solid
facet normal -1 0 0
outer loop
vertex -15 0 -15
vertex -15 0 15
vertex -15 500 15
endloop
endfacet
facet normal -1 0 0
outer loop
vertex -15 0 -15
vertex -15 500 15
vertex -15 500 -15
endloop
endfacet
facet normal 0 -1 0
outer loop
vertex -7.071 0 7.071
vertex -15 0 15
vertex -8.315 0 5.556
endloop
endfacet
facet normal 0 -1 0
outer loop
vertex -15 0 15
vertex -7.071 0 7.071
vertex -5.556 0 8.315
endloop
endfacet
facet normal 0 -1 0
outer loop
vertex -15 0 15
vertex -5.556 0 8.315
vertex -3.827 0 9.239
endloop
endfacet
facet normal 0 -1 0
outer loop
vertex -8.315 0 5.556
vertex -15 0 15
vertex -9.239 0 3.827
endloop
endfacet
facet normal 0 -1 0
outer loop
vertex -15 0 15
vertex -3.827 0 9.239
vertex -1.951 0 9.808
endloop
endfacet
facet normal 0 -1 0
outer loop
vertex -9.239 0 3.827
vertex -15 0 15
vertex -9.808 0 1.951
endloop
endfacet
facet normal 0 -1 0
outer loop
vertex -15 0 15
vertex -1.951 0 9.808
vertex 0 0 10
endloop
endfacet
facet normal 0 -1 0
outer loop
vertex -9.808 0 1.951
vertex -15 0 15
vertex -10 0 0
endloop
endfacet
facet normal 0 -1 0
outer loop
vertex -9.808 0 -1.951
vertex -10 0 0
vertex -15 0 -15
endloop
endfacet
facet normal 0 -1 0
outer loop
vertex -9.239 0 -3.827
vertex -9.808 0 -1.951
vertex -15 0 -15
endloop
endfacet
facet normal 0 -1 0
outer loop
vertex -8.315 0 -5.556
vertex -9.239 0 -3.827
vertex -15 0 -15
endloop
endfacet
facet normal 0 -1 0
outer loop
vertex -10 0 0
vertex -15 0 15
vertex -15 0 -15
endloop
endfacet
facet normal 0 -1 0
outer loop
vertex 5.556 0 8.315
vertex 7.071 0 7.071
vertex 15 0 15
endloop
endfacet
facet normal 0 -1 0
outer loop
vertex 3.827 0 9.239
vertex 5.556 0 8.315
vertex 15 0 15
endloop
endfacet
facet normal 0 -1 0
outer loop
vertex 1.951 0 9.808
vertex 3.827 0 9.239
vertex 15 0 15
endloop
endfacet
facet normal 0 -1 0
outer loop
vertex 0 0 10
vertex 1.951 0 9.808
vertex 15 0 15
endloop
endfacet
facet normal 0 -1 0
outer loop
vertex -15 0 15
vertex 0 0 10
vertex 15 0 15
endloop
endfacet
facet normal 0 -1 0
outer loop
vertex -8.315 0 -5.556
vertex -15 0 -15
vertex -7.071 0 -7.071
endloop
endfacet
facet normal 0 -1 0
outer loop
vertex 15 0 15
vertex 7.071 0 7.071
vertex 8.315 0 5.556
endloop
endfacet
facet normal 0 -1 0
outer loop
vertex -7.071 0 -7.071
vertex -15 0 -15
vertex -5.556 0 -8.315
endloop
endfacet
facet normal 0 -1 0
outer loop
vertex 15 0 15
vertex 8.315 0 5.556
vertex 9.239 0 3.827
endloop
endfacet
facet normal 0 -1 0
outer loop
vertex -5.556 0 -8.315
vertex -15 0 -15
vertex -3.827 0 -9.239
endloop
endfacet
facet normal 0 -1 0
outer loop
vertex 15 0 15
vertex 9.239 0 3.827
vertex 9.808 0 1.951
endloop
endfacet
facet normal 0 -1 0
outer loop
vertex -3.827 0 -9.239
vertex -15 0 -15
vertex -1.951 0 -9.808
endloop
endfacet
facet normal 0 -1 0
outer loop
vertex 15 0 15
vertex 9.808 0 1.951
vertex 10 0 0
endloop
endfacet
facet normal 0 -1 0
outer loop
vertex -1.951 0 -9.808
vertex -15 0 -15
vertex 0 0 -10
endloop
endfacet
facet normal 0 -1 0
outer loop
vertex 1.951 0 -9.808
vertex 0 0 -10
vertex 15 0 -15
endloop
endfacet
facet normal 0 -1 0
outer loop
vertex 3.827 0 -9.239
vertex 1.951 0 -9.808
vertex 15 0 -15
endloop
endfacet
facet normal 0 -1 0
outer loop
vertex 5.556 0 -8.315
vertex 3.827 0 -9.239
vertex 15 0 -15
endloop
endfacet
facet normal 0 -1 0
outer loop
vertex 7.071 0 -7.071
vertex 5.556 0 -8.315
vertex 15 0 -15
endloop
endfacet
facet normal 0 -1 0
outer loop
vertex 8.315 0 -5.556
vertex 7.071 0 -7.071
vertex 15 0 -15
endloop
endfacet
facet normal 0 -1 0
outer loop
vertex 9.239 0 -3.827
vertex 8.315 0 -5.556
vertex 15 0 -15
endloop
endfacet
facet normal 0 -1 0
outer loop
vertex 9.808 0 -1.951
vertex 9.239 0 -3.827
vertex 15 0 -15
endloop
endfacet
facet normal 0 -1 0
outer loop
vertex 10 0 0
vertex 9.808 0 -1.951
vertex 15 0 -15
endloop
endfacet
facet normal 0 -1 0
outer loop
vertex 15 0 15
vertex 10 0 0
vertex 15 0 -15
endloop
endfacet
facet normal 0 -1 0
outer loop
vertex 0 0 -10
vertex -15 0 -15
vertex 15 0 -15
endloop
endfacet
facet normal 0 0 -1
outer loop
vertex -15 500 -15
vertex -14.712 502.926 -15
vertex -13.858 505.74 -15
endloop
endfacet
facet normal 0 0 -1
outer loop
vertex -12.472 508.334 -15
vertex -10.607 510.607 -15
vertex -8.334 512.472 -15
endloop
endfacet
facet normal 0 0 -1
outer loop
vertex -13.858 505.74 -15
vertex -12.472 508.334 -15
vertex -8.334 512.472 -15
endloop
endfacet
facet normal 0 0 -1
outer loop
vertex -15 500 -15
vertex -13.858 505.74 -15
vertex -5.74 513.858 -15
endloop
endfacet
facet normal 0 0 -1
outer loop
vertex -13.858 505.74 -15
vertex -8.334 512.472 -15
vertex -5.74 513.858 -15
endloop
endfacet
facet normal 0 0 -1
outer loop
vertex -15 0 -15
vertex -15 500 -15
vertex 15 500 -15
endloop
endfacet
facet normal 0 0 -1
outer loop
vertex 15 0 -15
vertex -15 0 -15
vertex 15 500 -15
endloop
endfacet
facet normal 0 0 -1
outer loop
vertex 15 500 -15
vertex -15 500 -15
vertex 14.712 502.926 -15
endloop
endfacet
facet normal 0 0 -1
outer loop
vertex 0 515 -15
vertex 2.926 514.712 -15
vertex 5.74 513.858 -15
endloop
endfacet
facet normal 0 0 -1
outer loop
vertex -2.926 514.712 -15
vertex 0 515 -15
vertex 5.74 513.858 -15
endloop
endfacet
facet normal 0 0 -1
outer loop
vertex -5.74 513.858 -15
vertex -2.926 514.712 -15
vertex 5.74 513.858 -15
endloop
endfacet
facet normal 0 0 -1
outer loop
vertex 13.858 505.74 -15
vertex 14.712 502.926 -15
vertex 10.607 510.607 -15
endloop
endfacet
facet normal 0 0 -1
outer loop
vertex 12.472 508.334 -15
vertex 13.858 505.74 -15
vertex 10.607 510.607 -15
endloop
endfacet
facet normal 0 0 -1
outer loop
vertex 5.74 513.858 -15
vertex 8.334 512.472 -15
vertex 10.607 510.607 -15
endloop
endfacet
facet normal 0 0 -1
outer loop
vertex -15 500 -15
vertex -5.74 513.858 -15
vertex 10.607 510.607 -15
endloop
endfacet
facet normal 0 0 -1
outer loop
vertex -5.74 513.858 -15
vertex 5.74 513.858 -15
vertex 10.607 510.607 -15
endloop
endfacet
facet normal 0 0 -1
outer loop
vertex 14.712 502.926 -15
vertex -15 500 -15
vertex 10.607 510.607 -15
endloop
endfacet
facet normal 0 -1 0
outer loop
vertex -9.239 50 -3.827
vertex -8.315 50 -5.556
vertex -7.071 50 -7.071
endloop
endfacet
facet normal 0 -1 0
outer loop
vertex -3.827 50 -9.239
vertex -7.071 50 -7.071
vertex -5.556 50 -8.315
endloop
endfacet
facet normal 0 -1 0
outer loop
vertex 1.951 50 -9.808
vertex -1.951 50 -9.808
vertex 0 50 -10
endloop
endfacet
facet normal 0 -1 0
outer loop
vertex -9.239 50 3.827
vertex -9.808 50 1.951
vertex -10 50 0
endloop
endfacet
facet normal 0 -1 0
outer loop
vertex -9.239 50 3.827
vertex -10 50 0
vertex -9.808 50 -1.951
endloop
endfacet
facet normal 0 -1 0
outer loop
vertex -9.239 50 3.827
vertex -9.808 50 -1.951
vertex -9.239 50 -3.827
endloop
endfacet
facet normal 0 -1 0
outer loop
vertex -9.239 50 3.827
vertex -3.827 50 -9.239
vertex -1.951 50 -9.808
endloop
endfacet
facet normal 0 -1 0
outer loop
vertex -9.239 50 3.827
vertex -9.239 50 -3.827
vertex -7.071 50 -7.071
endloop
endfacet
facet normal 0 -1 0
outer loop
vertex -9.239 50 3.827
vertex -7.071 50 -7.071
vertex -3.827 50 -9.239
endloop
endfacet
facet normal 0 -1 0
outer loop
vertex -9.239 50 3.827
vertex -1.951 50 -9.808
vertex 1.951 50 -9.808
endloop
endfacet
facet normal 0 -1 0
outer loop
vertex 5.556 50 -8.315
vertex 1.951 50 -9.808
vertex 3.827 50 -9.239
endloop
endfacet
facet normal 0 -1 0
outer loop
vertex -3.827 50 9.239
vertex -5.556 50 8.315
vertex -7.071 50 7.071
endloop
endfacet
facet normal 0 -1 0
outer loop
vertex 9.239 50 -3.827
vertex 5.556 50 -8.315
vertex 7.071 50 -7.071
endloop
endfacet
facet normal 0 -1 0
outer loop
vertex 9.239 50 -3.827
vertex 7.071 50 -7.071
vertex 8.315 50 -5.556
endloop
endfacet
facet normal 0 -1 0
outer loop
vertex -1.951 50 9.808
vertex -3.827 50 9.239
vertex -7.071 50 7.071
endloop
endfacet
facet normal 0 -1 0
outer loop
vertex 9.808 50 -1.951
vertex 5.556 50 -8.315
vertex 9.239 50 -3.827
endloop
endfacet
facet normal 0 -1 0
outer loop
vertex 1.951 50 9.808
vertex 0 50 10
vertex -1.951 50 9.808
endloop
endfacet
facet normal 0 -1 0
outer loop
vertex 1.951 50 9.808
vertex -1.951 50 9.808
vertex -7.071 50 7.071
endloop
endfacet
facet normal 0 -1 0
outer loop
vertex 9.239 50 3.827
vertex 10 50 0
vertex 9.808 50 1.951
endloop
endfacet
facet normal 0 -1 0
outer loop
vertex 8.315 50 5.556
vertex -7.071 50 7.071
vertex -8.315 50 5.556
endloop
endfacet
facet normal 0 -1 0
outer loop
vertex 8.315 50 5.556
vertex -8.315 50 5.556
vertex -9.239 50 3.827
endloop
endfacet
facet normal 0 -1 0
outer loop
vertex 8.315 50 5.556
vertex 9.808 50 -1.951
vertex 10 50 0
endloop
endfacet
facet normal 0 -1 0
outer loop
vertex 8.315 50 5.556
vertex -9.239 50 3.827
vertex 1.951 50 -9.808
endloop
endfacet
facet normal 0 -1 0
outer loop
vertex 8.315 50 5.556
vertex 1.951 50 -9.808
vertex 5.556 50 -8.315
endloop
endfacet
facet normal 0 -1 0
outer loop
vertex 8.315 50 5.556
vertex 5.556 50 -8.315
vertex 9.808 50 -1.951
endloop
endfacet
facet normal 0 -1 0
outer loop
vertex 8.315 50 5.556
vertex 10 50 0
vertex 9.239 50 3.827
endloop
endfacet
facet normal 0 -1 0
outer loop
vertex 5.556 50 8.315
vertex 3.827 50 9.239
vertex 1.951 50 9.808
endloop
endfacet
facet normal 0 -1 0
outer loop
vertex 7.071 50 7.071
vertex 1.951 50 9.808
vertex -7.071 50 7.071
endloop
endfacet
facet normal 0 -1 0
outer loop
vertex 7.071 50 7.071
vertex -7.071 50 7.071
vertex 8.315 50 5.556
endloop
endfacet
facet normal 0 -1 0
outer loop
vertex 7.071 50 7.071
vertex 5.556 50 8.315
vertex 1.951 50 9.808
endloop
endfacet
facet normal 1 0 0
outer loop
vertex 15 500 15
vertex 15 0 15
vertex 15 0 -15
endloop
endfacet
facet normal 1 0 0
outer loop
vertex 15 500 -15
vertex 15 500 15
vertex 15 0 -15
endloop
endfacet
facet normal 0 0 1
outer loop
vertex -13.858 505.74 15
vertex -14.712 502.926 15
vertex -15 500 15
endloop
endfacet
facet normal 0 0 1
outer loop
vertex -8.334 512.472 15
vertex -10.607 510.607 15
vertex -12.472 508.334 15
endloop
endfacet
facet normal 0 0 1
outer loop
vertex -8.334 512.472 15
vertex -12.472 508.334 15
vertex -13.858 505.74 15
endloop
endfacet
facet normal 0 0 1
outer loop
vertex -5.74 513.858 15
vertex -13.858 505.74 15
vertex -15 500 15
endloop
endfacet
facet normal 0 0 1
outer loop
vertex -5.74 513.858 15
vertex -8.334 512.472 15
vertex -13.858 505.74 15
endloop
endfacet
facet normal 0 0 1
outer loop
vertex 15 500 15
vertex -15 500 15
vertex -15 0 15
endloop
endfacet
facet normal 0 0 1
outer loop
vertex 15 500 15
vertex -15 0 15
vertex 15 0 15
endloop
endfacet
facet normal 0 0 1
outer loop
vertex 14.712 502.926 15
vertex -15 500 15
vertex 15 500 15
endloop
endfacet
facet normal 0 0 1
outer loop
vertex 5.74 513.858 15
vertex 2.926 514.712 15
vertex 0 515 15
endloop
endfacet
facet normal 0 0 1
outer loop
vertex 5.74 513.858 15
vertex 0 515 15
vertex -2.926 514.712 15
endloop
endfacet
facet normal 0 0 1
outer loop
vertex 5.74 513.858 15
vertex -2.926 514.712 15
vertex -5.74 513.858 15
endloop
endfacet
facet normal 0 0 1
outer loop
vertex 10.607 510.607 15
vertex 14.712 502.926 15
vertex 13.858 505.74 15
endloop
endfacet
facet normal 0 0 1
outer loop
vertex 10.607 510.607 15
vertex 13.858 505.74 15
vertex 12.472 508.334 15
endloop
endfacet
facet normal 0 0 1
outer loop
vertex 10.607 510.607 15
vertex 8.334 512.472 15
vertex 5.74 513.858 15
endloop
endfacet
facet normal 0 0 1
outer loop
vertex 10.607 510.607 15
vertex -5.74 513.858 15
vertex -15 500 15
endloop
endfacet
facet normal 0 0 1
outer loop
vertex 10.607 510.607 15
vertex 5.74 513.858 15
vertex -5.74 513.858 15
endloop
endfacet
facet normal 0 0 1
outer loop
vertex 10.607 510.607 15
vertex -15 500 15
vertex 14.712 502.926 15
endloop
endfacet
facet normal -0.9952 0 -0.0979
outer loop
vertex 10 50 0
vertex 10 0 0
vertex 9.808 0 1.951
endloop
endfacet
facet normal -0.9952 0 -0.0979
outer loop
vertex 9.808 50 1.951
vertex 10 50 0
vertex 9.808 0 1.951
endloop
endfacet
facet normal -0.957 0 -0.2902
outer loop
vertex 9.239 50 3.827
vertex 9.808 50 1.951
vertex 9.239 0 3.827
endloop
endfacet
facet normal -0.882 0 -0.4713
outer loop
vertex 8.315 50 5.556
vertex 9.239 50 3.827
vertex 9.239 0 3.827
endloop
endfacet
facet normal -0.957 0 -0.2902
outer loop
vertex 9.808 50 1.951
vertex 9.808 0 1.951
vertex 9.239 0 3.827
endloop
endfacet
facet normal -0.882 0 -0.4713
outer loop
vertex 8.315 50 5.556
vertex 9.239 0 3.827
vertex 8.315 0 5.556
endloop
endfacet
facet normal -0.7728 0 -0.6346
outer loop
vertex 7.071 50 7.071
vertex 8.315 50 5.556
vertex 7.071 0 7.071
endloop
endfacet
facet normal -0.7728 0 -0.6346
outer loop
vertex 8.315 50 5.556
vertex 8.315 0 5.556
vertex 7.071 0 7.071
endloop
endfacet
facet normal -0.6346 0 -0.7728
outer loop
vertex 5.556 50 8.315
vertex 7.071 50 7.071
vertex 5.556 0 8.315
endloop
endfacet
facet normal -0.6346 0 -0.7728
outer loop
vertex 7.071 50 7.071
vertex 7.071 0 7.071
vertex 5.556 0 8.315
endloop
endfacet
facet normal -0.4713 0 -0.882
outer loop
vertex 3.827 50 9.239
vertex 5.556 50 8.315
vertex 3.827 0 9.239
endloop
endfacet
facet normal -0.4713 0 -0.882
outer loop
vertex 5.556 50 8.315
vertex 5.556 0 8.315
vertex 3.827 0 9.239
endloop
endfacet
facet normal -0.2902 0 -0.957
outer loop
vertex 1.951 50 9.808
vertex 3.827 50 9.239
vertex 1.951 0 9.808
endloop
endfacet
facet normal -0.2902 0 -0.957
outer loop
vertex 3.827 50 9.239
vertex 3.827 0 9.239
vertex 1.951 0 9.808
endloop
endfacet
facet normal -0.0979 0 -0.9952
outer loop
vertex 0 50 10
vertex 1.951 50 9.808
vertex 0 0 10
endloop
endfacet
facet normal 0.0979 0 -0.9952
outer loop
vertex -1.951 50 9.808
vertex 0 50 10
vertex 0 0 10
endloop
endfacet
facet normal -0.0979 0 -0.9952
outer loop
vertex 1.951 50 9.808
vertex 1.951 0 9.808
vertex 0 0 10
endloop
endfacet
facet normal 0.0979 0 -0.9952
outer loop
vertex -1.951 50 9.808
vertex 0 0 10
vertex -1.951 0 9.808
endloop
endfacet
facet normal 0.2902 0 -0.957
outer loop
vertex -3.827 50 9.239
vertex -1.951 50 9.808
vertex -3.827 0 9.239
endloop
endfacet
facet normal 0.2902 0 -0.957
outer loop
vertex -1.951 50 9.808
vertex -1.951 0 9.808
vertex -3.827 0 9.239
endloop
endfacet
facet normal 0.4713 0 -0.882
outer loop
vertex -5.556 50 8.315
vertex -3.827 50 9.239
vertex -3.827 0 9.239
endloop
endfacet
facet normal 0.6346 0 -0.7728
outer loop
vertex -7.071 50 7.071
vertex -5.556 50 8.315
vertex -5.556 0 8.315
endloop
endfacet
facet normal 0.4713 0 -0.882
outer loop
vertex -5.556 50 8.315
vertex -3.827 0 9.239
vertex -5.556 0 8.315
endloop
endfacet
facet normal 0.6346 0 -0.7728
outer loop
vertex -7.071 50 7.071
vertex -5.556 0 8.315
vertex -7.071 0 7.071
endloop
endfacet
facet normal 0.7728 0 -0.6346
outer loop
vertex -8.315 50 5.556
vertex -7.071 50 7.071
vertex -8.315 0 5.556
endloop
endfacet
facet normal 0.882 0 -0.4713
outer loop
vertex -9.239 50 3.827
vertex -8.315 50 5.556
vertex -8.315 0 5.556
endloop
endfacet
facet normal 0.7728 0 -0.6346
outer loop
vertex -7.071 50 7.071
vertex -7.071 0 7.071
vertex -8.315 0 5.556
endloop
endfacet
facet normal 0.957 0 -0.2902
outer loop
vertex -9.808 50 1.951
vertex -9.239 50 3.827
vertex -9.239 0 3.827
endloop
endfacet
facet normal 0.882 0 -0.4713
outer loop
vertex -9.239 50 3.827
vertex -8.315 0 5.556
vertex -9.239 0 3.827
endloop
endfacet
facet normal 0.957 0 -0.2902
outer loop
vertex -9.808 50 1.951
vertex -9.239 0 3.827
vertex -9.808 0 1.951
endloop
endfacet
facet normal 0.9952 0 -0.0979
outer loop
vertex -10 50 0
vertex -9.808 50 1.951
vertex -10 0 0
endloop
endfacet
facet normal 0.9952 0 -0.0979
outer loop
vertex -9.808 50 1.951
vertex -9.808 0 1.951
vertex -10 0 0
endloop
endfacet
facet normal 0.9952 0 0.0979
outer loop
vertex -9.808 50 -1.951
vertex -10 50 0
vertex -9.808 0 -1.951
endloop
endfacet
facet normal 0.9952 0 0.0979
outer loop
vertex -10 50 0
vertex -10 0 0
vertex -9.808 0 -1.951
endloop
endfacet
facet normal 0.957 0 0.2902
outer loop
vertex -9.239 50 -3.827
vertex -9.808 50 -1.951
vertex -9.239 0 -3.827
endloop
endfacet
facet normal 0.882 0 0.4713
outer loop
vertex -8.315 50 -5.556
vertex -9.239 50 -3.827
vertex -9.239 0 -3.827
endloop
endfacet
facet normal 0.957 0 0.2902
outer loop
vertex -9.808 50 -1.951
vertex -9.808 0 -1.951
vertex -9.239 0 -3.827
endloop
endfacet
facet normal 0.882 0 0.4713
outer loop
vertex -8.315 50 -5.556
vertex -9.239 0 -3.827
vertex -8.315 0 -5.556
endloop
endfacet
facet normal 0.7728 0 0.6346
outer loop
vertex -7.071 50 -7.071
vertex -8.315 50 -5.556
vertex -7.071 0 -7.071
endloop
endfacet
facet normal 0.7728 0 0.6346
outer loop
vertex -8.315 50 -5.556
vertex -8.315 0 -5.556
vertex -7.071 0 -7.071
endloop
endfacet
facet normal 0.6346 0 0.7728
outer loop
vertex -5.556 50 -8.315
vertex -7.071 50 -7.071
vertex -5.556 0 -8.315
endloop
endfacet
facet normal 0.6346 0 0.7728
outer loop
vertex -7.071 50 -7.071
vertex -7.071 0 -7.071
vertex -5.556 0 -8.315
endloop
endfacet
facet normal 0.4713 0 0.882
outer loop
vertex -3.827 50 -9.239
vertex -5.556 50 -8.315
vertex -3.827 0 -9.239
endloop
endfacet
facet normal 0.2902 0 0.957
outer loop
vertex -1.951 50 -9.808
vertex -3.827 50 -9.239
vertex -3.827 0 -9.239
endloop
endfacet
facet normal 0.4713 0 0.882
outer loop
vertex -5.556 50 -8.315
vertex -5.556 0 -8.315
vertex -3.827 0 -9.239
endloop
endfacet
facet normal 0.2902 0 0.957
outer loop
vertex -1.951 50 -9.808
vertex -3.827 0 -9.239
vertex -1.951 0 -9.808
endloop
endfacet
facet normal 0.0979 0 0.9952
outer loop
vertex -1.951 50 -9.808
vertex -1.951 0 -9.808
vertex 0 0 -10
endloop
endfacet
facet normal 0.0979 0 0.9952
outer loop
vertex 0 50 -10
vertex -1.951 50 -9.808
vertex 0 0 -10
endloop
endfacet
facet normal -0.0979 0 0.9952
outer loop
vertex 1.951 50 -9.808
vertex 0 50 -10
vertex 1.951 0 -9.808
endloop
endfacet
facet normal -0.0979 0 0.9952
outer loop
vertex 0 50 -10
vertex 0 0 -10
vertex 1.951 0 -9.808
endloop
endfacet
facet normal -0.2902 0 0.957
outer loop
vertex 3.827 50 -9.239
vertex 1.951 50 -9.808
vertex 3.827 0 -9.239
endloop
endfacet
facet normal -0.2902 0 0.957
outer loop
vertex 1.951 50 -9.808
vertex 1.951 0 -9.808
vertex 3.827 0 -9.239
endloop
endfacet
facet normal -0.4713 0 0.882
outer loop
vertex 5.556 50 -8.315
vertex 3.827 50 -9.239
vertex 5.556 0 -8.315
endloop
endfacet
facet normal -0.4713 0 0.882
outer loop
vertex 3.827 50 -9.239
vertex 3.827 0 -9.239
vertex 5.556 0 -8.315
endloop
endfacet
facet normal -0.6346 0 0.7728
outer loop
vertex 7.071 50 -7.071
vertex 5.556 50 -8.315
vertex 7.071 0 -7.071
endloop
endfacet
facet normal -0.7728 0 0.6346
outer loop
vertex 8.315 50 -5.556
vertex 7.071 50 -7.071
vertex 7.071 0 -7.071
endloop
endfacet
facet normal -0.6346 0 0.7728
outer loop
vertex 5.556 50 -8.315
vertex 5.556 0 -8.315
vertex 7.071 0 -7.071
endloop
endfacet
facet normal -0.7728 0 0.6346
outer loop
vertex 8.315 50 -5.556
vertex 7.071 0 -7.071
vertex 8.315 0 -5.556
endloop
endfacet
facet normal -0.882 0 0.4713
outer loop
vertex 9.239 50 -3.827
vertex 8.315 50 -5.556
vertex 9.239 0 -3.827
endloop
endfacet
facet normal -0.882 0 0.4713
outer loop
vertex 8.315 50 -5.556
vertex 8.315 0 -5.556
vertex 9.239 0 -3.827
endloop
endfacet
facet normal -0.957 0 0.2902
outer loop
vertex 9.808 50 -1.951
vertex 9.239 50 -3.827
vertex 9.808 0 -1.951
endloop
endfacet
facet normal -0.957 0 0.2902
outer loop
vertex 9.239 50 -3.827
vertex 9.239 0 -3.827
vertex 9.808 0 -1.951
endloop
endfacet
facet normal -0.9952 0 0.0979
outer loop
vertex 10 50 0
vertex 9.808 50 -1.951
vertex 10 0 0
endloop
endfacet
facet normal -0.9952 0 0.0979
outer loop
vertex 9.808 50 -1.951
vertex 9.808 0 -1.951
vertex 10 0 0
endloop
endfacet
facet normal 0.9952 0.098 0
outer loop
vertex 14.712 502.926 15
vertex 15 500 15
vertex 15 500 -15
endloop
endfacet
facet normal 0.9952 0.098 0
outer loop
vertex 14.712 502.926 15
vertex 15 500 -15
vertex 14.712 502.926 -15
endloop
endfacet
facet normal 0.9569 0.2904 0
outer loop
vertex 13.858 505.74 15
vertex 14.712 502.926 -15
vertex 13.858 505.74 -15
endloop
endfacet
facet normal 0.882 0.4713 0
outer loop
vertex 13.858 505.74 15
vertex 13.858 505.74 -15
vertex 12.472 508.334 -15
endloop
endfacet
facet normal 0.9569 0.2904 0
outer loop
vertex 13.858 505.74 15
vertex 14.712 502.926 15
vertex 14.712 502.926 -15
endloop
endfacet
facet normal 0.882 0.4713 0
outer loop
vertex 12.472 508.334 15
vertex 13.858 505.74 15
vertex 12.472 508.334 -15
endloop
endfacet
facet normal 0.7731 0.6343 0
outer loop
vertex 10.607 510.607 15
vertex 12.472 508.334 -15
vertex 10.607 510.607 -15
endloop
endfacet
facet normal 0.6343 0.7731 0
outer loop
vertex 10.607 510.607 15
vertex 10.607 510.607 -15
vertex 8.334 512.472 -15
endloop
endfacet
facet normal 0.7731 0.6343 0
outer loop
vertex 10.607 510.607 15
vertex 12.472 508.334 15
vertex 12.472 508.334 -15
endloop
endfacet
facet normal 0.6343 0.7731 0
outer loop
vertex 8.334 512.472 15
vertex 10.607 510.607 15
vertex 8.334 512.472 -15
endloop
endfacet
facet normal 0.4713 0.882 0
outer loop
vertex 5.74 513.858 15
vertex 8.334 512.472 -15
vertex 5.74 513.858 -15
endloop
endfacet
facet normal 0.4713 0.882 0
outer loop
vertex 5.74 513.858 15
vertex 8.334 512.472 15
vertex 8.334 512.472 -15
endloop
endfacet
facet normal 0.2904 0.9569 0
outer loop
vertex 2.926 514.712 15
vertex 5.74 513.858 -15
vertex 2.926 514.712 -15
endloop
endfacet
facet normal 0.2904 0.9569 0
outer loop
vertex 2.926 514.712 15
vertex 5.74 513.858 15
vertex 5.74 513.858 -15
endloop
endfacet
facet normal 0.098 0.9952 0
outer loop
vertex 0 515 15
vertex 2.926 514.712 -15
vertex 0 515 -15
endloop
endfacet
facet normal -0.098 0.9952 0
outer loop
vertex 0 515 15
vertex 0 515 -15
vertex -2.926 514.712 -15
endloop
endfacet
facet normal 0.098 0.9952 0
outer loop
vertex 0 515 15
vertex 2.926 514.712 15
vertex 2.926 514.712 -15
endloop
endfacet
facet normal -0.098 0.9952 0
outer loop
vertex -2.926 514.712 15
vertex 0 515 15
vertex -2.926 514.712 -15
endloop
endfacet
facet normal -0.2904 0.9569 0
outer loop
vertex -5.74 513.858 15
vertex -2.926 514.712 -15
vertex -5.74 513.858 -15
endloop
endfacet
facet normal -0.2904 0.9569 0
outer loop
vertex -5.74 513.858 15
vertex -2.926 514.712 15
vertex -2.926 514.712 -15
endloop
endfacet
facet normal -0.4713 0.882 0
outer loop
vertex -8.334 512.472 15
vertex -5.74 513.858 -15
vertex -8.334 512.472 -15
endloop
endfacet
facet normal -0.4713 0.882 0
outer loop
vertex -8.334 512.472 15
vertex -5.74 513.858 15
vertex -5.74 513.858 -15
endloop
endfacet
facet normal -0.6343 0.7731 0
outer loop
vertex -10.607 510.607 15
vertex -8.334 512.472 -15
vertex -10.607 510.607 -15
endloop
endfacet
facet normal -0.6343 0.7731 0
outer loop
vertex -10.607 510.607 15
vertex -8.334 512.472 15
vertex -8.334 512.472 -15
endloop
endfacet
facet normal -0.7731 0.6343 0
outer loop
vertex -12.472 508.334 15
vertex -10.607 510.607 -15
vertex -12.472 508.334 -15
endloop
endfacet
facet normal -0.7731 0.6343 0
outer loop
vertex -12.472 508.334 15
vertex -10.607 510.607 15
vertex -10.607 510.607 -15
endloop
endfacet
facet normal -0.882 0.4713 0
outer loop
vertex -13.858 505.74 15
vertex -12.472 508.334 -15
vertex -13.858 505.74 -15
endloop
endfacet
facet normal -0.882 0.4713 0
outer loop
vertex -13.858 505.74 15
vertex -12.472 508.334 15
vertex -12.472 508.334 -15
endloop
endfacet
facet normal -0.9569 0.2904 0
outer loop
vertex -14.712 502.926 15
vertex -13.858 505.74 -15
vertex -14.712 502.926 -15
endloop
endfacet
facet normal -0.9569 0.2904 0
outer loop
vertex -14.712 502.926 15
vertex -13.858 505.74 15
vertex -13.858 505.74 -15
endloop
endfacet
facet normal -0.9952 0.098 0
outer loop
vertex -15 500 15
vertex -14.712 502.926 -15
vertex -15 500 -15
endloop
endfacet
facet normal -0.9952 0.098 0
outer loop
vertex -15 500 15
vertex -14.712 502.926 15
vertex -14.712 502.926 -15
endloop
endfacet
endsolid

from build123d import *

# Parameters (mm, degrees)
SKETCH1_W           = 30
SKETCH1_H           = 30
BOSS_EXTRUDE1_DEPTH = 500
SKETCH2_R           = 15
BOSS_EXTRUDE2_DEPTH = 30
SKETCH4_R           = 10
CUT_EXTRUDE1_DEPTH  = 50


with BuildPart() as part:
    # Sketch1 → Boss-Extrude1 (new body)
    with BuildSketch(Plane(origin=(0, 0, 0), x_dir=(1, 0, 0), z_dir=(0, 1, 0))):
        Rectangle(SKETCH1_W, SKETCH1_H)
    extrude(amount=BOSS_EXTRUDE1_DEPTH)

    # Sketch2 → Boss-Extrude2 (add)
    with BuildSketch(Plane.XY.offset(15)):
        with Locations((0, 500)):
            Circle(SKETCH2_R)
    extrude(amount=-BOSS_EXTRUDE2_DEPTH)

    # Sketch4 → Cut-Extrude1 (cut)
    with BuildSketch(Plane.XZ):
        Circle(SKETCH4_R)
    extrude(amount=-CUT_EXTRUDE1_DEPTH, mode=Mode.SUBTRACT)


solid = part.part
